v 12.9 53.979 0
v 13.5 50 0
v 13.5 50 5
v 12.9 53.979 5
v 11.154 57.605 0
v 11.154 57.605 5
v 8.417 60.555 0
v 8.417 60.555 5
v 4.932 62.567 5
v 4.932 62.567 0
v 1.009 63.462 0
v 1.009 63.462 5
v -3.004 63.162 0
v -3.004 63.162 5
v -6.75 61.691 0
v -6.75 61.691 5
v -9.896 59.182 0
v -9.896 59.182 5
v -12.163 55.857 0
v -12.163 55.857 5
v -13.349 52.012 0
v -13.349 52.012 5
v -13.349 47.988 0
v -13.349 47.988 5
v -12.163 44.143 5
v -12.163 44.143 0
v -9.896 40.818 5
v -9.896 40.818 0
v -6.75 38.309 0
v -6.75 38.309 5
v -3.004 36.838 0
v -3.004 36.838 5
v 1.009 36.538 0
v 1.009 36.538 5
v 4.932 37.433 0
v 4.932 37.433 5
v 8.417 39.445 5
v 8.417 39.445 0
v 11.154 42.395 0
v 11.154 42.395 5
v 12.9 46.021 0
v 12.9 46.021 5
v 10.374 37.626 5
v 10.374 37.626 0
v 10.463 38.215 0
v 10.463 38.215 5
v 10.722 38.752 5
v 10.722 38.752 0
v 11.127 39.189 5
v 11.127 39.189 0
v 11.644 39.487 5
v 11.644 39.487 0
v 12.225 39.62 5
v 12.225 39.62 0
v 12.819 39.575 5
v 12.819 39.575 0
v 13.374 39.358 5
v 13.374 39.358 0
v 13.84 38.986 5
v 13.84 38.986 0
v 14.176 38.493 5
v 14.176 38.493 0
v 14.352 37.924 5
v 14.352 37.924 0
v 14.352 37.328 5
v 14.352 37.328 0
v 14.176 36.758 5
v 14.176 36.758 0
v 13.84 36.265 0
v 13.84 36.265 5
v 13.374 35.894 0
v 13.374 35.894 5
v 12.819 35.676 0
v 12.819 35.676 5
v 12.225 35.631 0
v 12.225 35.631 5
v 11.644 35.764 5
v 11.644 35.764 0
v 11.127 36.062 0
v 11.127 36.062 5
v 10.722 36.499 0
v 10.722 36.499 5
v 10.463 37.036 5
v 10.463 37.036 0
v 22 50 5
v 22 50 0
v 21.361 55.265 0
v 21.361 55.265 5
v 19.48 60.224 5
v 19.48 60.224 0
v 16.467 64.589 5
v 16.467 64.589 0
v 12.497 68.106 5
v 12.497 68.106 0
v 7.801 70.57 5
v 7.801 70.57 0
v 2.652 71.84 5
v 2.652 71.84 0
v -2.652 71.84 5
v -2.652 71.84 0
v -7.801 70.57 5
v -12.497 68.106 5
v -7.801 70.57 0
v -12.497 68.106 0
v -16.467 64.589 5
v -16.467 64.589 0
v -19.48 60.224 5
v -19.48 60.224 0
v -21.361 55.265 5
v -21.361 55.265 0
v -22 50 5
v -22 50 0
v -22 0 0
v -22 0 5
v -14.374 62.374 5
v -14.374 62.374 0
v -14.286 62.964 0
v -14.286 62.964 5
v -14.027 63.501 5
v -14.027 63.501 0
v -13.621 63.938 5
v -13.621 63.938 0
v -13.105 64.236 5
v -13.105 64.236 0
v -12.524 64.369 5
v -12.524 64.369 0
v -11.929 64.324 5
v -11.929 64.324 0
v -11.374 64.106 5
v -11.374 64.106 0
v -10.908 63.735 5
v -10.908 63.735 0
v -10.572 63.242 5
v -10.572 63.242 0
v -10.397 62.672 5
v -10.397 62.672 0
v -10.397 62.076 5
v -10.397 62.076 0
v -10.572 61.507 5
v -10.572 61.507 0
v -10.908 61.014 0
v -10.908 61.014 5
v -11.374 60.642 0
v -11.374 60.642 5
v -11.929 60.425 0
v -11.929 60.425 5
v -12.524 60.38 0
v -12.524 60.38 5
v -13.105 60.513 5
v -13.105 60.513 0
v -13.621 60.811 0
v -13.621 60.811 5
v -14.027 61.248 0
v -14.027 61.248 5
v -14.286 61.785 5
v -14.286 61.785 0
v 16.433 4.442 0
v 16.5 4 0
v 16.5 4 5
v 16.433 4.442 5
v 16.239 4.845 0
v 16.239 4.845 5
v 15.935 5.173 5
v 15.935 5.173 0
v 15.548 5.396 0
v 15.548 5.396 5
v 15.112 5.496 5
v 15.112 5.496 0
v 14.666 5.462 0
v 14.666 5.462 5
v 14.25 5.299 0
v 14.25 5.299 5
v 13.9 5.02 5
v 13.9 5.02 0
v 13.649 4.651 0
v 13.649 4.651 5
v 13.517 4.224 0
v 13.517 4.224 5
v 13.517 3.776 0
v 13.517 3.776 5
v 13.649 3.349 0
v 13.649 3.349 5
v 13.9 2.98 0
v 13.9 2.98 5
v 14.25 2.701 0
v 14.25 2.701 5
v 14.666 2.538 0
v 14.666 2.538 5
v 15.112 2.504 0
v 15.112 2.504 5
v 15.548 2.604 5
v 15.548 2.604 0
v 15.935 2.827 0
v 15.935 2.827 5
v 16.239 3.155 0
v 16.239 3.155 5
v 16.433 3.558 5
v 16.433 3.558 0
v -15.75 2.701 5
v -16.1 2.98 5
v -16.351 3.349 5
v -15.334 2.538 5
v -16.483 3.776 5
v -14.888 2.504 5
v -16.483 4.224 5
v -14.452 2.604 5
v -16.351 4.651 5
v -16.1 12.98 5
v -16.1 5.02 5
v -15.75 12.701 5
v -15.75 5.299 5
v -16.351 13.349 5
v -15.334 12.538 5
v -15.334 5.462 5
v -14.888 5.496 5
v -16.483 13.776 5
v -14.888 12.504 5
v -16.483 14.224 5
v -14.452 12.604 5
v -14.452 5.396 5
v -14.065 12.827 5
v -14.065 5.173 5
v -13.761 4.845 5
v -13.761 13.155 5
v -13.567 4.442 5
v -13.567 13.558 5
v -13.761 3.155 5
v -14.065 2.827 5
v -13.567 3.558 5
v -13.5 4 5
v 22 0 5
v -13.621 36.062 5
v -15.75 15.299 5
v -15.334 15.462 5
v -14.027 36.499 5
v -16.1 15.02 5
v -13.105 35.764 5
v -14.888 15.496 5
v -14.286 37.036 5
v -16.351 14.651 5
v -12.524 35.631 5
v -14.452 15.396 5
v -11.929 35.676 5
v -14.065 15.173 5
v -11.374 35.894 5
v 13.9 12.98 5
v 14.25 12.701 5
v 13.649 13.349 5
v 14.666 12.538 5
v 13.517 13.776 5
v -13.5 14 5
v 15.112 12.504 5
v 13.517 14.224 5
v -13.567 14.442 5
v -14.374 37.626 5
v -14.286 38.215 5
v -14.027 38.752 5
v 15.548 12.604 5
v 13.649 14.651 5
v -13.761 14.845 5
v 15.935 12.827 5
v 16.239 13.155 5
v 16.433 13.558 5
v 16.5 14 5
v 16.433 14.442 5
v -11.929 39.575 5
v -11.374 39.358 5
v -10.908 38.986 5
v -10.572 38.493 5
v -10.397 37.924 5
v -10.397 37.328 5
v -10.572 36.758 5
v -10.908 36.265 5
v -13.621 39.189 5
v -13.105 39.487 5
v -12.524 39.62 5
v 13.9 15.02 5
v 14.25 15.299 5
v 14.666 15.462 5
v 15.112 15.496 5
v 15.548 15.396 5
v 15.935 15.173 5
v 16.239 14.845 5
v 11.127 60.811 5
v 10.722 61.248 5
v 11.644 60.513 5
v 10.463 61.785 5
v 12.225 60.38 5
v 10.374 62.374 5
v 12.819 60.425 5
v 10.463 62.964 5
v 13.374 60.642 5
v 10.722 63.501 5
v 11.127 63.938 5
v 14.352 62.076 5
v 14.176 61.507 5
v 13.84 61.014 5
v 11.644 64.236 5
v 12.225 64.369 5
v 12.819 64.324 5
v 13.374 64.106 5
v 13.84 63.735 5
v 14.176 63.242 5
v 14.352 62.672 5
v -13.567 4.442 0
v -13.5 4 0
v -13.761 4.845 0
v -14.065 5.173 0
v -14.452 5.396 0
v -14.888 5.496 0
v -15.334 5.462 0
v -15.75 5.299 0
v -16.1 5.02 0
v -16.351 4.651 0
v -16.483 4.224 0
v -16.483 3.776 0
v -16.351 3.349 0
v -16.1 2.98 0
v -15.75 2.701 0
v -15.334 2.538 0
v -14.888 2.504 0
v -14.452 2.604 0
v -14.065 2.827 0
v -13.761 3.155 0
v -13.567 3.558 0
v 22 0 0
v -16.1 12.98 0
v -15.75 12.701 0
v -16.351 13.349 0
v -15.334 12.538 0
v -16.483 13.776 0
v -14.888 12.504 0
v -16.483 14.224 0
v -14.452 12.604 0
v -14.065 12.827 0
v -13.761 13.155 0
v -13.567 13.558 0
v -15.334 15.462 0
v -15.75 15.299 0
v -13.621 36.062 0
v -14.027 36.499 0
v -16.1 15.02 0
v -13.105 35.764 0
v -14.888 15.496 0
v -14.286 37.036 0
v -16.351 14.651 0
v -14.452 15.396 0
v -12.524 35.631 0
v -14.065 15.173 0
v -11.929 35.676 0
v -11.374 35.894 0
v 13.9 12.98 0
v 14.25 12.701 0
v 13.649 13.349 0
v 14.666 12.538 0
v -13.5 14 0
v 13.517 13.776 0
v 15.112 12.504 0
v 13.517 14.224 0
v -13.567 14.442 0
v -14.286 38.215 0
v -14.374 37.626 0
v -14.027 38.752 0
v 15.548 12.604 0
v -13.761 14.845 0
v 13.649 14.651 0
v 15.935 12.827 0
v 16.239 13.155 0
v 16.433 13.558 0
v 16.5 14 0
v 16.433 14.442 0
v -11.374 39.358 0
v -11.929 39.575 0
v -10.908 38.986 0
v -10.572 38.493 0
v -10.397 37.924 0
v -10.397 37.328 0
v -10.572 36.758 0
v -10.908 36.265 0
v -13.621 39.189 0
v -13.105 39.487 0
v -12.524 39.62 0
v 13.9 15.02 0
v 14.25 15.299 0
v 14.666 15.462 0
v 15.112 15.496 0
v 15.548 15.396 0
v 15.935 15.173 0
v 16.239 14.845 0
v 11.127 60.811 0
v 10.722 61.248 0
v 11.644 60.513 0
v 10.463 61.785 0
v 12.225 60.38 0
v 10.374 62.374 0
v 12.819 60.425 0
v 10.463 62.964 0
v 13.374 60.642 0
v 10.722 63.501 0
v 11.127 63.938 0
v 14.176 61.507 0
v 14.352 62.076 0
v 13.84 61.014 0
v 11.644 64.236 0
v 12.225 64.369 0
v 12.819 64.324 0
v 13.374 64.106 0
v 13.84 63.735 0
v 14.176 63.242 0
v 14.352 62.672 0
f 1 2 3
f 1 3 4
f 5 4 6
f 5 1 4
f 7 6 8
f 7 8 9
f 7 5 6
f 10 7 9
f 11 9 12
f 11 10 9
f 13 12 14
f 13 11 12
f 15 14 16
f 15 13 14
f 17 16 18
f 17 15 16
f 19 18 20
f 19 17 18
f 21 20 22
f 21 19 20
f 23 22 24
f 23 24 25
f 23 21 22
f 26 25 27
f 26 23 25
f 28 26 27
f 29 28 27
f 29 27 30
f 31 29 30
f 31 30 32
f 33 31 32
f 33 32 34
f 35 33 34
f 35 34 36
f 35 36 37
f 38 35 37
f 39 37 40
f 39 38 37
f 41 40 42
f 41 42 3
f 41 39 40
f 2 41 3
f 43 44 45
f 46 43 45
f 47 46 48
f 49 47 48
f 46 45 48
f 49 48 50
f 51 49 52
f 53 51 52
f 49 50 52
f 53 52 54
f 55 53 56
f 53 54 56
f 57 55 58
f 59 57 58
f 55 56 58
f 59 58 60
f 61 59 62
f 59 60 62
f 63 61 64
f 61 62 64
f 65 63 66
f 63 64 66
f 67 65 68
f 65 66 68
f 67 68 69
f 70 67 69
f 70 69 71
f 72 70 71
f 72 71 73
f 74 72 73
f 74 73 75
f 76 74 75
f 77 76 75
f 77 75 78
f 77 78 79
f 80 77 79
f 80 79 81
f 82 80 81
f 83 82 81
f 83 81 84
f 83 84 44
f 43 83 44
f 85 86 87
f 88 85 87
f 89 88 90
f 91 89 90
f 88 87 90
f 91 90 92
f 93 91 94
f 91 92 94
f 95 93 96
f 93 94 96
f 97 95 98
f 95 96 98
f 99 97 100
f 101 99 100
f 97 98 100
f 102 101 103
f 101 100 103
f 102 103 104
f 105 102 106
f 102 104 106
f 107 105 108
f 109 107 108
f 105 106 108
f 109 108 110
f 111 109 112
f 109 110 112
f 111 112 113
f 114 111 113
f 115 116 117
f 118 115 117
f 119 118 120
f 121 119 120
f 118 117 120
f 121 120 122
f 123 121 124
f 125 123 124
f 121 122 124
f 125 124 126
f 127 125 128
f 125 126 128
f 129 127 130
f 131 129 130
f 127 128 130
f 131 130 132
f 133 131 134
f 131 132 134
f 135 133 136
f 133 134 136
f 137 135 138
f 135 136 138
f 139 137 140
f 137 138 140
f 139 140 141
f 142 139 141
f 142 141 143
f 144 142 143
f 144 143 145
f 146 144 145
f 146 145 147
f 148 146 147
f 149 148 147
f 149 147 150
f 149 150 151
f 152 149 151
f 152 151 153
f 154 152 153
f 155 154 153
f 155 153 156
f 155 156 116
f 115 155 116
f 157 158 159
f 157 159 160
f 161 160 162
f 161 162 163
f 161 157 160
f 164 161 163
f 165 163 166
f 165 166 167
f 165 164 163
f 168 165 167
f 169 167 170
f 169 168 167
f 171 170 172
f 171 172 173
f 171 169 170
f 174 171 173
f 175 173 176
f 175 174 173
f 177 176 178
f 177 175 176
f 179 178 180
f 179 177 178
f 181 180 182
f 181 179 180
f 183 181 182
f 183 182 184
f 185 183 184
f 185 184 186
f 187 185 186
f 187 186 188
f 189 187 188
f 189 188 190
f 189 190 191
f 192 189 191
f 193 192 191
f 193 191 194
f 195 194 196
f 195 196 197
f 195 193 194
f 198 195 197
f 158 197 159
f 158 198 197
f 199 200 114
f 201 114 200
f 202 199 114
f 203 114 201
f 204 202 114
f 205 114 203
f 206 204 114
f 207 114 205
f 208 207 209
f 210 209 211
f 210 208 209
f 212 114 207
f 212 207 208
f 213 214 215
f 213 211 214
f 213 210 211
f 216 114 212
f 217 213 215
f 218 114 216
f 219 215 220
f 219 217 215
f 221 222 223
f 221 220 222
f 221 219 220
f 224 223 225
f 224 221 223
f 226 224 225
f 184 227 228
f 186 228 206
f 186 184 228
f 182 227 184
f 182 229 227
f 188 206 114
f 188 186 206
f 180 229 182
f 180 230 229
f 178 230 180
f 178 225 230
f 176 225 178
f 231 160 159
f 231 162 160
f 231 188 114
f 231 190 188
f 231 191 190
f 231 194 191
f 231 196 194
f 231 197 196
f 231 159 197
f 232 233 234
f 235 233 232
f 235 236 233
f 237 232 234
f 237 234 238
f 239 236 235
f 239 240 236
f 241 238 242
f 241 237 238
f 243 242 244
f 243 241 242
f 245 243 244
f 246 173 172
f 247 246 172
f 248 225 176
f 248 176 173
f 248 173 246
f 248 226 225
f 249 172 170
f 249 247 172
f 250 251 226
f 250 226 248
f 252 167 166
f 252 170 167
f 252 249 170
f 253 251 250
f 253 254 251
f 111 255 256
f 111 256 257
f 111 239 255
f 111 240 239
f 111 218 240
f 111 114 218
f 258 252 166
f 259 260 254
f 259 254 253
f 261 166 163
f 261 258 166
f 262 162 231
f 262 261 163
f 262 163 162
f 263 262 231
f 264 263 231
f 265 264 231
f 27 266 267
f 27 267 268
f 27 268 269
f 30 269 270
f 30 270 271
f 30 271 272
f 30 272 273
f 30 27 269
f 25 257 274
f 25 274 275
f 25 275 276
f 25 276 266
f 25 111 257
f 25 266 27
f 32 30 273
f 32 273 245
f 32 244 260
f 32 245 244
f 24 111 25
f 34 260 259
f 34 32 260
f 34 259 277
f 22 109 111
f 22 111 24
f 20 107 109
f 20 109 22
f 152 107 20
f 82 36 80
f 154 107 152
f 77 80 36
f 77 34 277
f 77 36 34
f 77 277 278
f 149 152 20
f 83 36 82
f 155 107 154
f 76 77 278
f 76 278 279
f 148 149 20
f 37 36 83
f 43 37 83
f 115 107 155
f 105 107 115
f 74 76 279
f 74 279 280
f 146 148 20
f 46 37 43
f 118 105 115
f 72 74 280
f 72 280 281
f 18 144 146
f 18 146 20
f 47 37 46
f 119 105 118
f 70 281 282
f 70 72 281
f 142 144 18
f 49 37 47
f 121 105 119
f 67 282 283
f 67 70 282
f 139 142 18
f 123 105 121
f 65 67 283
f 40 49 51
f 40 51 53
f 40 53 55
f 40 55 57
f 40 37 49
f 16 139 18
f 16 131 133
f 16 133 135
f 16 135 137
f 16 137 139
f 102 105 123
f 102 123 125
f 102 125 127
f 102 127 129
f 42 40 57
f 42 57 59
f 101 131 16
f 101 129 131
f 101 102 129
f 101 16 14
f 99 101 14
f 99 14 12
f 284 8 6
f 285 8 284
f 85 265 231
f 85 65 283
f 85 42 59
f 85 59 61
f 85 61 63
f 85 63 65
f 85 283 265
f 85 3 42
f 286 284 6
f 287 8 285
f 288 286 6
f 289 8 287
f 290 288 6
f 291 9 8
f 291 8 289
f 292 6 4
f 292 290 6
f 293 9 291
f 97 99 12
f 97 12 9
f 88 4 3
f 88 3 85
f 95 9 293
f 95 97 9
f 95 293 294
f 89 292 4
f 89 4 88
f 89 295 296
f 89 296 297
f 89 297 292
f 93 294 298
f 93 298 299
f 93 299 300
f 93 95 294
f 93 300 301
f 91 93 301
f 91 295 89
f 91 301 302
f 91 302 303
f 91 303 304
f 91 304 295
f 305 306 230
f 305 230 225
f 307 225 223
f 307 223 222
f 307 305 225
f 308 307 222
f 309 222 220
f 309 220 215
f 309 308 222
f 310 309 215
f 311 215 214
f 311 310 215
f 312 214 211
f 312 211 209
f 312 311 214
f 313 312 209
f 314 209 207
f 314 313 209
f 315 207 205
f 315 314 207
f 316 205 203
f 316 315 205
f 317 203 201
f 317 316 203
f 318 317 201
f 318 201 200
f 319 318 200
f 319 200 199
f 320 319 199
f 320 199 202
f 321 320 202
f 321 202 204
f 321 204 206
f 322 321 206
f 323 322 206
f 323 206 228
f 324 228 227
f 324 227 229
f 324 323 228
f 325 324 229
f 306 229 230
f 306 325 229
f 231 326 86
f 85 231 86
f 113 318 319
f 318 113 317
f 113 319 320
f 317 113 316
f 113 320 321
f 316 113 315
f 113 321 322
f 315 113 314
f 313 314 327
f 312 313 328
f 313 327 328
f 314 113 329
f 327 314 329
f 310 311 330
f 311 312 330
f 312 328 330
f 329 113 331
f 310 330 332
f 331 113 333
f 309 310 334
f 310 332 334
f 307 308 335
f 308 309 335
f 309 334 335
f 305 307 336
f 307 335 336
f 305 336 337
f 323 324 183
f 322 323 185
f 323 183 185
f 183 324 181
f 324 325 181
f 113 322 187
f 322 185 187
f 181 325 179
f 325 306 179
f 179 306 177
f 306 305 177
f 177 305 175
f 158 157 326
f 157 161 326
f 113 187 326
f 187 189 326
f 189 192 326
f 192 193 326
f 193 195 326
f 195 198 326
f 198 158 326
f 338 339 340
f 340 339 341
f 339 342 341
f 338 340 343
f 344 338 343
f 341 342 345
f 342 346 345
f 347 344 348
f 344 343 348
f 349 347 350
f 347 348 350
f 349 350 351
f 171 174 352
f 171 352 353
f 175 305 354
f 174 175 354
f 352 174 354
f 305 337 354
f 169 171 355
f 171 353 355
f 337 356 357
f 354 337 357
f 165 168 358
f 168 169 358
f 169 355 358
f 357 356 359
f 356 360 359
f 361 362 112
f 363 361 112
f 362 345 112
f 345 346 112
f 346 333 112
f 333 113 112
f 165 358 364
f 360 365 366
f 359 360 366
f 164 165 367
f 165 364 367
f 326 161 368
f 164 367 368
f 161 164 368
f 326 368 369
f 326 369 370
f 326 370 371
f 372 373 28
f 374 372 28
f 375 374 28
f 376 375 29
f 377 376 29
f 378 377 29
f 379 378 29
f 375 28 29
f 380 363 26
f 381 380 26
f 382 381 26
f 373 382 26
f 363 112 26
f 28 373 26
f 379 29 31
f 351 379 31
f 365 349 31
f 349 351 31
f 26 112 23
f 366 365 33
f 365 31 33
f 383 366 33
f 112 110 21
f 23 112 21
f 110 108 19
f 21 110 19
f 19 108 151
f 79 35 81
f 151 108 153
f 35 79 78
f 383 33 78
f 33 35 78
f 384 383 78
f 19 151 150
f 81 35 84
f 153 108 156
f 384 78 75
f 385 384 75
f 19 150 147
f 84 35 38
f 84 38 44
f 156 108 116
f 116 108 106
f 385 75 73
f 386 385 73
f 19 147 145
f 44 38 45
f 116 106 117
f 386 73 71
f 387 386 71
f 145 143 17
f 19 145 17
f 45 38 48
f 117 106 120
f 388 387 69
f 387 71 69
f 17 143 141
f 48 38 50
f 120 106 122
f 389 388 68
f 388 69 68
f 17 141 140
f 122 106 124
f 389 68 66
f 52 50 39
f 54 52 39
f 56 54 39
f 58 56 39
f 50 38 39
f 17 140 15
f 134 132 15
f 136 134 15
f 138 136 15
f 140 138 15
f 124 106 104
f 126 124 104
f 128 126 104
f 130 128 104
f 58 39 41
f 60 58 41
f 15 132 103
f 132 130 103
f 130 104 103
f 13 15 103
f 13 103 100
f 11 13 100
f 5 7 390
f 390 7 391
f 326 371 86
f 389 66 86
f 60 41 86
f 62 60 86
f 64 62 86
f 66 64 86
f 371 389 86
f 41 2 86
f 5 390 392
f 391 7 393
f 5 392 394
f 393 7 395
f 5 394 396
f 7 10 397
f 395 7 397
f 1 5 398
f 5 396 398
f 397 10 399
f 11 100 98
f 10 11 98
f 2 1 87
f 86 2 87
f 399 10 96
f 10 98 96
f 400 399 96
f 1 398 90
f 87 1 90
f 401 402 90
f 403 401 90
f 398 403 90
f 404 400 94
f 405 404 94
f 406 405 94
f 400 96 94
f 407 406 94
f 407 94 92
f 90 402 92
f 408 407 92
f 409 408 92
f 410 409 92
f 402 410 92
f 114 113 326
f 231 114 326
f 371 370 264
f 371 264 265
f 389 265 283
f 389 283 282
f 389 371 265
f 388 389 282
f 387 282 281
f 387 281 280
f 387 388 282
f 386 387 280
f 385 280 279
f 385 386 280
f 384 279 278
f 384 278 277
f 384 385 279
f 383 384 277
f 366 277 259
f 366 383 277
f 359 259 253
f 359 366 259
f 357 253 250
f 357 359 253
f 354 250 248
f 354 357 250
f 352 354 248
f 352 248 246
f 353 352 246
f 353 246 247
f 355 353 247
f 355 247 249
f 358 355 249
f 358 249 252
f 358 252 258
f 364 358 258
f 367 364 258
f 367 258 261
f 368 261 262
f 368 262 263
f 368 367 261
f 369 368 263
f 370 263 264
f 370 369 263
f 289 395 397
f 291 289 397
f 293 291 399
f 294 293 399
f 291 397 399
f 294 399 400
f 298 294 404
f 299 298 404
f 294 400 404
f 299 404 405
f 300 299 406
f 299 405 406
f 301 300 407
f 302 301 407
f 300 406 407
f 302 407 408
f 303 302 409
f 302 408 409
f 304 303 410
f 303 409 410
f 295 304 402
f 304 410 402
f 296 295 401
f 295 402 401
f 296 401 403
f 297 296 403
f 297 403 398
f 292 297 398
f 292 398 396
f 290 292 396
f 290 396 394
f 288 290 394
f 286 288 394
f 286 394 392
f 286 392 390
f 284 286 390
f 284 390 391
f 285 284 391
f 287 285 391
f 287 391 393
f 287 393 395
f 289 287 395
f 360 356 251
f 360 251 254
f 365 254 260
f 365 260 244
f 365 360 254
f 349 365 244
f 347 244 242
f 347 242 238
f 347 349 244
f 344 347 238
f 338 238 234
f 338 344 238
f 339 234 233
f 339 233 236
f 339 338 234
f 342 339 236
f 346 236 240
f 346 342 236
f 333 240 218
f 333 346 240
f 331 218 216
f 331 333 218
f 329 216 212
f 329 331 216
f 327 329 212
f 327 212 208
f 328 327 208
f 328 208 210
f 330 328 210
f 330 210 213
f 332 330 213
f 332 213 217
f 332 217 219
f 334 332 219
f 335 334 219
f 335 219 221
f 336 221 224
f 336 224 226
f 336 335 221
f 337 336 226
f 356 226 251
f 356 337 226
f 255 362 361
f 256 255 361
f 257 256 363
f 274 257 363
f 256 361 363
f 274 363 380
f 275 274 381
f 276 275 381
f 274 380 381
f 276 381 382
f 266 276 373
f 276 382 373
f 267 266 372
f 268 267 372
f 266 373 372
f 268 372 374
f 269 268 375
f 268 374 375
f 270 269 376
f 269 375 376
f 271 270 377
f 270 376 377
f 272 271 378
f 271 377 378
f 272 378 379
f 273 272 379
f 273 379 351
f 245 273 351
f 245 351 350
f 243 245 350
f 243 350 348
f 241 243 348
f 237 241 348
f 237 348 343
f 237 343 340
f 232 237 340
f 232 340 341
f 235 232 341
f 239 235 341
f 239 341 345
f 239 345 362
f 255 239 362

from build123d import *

# Parameters (mm, degrees)
SKETCH_1_R          = 1.5
SKETCH_1_R_2        = 13.5
EXTRUDE_1_DEPTH     = 5
SKETCH_2_R          = 2
CUT_EXTRUDE_1_DEPTH = 6


with BuildPart() as part:
    # 草图1 → 凸台-拉伸1 (new body)
    with BuildSketch(Plane.XY):
        with BuildLine():
            Line((-22, 0), (22, 0))
            Line((22, 0), (22, 50))
            ThreePointArc((22, 50), (0, 72), (-22, 50))
            Line((-22, 50), (-22, 0))
        make_face()
        with Locations((-15, 14)):
            Circle(SKETCH_1_R, mode=Mode.SUBTRACT)
        with Locations((-15, 4)):
            Circle(SKETCH_1_R, mode=Mode.SUBTRACT)
        with Locations((15, 4)):
            Circle(SKETCH_1_R, mode=Mode.SUBTRACT)
        with Locations((15, 14)):
            Circle(SKETCH_1_R, mode=Mode.SUBTRACT)
        with Locations((0, 50)):
            Circle(SKETCH_1_R_2, mode=Mode.SUBTRACT)
    extrude(amount=EXTRUDE_1_DEPTH)

    # 草图2 → 切除-拉伸1 (cut, through all)
    with BuildSketch(Plane(origin=(0, 0, 0), x_dir=(-1, 0, 0), z_dir=(0, 0, -1))):
        with Locations((12.374368671, 62.374368671)):
            Circle(SKETCH_2_R)
        with Locations((12.374368671, 37.625631329)):
            Circle(SKETCH_2_R)
        with Locations((-12.374368671, 37.625631329)):
            Circle(SKETCH_2_R)
        with Locations((-12.374368671, 62.374368671)):
            Circle(SKETCH_2_R)
    extrude(amount=-CUT_EXTRUDE_1_DEPTH, mode=Mode.SUBTRACT)


solid = part.part
